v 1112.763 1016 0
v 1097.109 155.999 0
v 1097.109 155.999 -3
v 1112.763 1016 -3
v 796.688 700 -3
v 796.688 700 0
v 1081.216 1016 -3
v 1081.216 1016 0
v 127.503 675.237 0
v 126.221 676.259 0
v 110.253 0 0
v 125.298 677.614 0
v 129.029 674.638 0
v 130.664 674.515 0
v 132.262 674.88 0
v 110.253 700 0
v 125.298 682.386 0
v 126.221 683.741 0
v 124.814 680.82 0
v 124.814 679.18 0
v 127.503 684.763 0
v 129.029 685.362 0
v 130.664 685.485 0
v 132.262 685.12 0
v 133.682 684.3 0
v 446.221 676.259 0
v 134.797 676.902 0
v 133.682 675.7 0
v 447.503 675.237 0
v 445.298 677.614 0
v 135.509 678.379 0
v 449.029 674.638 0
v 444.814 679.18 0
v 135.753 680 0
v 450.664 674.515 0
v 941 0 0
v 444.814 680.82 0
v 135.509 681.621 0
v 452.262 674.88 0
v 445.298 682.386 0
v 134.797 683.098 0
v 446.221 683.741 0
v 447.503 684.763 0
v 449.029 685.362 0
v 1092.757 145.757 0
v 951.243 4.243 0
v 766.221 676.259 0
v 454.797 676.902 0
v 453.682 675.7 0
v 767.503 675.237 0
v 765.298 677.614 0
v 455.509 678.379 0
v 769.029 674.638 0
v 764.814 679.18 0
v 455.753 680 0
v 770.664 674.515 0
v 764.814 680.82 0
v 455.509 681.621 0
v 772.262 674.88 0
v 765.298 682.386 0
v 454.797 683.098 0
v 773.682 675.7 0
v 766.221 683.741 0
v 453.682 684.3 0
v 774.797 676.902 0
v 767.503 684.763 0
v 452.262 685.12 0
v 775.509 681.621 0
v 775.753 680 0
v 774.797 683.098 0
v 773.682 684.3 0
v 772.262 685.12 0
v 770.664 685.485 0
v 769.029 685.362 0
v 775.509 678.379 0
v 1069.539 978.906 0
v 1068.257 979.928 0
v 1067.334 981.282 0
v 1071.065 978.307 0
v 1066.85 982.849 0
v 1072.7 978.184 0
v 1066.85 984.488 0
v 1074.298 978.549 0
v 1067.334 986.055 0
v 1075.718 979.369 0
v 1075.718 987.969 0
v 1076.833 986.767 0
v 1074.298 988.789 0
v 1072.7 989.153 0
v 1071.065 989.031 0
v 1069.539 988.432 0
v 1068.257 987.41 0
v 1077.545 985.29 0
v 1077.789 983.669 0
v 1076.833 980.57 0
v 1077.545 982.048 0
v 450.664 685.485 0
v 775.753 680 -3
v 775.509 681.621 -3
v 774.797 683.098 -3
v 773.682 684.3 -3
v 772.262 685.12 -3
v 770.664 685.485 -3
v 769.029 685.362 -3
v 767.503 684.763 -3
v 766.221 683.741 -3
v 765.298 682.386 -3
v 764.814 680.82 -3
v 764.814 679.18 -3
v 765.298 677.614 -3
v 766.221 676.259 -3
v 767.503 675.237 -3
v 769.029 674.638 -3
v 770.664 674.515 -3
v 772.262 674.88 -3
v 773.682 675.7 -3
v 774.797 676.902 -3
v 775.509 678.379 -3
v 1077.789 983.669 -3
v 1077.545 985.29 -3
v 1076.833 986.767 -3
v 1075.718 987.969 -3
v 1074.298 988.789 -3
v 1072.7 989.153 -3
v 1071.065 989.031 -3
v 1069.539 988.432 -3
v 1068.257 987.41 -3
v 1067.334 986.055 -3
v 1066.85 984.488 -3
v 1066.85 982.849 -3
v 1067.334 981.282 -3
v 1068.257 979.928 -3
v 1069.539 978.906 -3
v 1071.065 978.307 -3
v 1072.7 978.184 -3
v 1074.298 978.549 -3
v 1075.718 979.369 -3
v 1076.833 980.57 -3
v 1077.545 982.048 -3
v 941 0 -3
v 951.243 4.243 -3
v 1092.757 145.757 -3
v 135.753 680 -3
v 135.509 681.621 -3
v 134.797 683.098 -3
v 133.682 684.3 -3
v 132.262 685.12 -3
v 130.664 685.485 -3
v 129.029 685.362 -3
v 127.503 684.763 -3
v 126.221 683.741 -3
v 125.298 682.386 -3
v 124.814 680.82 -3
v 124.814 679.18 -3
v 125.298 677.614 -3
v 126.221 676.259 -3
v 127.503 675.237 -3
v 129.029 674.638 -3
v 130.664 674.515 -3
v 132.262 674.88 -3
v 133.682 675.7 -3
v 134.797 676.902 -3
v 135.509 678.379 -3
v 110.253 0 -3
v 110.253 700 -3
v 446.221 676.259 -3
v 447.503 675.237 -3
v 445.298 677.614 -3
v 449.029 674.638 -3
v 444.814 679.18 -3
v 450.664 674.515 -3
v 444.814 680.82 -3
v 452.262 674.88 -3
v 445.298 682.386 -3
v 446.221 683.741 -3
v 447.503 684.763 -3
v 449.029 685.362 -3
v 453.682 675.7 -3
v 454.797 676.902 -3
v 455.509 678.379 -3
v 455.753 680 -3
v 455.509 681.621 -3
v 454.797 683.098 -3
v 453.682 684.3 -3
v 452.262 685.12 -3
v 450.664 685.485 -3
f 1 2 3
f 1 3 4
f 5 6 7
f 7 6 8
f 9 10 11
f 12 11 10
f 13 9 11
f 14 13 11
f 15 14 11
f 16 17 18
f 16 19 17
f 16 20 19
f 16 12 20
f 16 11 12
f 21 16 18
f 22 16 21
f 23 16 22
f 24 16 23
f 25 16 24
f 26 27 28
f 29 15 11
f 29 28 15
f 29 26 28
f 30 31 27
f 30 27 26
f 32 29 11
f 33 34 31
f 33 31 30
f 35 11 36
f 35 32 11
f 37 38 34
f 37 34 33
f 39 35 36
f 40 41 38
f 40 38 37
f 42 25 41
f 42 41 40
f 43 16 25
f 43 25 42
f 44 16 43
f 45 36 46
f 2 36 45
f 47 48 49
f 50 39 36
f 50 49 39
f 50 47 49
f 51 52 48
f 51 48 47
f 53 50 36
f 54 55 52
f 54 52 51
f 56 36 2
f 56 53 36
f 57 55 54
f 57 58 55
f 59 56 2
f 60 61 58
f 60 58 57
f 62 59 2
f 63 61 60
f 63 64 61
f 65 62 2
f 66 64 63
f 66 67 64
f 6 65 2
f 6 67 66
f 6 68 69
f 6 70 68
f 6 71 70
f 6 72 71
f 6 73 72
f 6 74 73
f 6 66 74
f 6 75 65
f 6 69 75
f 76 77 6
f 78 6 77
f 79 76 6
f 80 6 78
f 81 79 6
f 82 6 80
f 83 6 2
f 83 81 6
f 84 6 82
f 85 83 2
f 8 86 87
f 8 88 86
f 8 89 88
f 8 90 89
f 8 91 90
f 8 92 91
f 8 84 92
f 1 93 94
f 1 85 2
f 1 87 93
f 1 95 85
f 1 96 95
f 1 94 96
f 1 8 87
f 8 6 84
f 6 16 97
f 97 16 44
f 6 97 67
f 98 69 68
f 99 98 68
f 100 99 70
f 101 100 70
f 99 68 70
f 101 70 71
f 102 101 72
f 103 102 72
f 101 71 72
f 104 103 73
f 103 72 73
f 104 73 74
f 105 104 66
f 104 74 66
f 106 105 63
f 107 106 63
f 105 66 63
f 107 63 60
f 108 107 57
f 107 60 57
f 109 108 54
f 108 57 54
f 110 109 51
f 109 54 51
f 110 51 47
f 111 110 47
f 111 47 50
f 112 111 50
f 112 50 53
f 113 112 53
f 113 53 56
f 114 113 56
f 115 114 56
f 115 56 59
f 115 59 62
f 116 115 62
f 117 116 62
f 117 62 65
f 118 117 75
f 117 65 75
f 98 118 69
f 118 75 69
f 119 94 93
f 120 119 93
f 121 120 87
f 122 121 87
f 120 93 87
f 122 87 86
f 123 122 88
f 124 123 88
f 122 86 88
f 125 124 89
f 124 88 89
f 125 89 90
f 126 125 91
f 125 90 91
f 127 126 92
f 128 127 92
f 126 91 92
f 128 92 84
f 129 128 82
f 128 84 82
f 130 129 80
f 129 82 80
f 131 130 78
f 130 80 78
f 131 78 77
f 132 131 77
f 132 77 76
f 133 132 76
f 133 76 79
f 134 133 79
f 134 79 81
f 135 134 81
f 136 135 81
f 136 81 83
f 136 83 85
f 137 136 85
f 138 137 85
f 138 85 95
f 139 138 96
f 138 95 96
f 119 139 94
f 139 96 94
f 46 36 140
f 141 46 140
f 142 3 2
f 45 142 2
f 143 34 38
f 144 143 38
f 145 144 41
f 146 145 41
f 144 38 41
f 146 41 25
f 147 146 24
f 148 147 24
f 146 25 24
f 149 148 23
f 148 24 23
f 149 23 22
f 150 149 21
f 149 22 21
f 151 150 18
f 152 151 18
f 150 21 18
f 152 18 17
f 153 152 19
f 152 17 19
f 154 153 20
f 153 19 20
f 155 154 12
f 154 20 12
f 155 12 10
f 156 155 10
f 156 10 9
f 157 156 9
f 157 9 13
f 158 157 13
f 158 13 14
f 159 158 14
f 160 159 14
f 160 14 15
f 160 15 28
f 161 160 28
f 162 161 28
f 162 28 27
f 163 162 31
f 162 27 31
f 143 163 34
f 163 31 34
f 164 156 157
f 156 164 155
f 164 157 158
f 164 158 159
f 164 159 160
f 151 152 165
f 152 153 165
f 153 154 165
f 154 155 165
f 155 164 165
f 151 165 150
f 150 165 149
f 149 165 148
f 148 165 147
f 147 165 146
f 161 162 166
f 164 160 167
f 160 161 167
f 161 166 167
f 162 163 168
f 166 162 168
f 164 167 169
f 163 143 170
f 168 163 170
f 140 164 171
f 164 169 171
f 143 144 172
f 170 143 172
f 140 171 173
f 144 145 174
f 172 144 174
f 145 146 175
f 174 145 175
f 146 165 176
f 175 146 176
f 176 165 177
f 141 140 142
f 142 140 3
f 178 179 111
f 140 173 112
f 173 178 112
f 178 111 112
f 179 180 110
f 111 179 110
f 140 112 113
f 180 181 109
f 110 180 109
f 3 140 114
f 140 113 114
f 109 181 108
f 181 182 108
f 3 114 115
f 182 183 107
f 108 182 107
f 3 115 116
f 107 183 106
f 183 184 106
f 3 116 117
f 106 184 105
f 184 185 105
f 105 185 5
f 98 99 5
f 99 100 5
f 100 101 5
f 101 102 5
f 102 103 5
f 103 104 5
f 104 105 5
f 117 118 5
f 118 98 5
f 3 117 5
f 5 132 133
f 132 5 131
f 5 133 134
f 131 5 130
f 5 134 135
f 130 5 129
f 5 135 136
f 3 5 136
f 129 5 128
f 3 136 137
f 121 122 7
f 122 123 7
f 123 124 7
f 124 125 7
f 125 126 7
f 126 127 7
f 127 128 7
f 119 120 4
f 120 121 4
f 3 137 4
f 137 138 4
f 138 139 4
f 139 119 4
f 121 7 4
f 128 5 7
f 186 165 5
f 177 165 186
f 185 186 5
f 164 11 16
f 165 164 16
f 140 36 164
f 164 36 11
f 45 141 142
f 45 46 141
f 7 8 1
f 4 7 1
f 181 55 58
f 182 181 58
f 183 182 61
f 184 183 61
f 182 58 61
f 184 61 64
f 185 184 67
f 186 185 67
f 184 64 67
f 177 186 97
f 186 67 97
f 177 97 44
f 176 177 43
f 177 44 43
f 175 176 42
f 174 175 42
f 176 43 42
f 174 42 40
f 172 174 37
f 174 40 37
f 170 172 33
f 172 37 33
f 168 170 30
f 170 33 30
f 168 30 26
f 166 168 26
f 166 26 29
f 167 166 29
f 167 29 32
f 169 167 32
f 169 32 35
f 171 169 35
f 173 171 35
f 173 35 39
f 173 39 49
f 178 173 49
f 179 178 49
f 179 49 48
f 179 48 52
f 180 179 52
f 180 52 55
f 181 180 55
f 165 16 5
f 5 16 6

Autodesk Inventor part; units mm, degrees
ref_plane "YZ Plane" through (0, 0, 0) normal (1, 0, 0) x (0, 1, 0)
ref_plane "XZ Plane" through (0, 0, 0) normal (0, 1, 0) x (-1, 0, 0)
ref_plane "XY Plane" through (0, 0, 0) normal (0, 0, 1) x (1, 0, 0)
sketch "Sketch8" plane through (0, 0, 0) normal (0, 0, 1) x (1, 0, 0)
  line L0 (0, 2897) -> (1200, 2897)
  line L1 (1200, 2897) -> (1200, 0)
  line L2 (1200, 0) -> (0, 0)
  line L3 (0, 0) -> (0, 2897)
  line L4 (0, 2897) -> (1200, 0) construction
  line L5 (1200, 2897) -> (0, 0) construction
  line L6 (947, 0) -> (1097, 150)
  line L7 (1097, 150) -> (1147, 2897)
  line L8 (0, 700) -> (1200, 700)
  line L9 (1112.5806, 1006) -> (837.057, 700)
  line L10 (110.253, 0) -> (110.253, 700)
  line L11 (796.688, 700) -> (1081.2157, 1016)
  line L12 (1081.2157, 1016) -> (1112.7627, 1016)
  point P0 (600, 1448.5)
  point P1 (1107.0109, 700)
  dimension "d43" = 1200
  dimension "d44" = 2897
  dimension "d45" = 53
  dimension "d46" = 947
  dimension "d47" = 150
  dimension "d48" = 103
  dimension "d49" = 700
  dimension "d55" = 306
  dimension "d57" = 110.253
  dimension "d61" = 48
  dimension "d65" = 10
  dimension "d66" = 30
extrude "Plate4" add sketch "Sketch8" against normal blind 3 contours L7 L9 L8 L11 L12 | L8 L7 L6 L2 L10 | L7 L8 L9
chamfer "Corner Chamfer1" distance 6 angle 45 2 edges at (947, 0, -1.5) (1097, 150, -1.5)
sketch "Sketch9" plane through (0, 0, 0) normal (0, 0, 1) x (1, 0, 0)
  line L0 (1097.1092, 155.999) -> (1092.7574, 145.7574) projected
  line L1 (1097.1092, 155.999) -> (1112.7627, 1016) projected
  line L2 (1112.7627, 1016) -> (1081.2157, 1016) projected
  line L3 (1081.2157, 1016) -> (796.688, 700) projected
  line L4 (796.688, 700) -> (110.253, 700) projected
  line L5 (110.253, 700) -> (110.253, 0) projected
  line L6 (110.253, 0) -> (941, 0) projected
  line L7 (951.2426, 4.2426) -> (941, 0) projected
  line L8 (951.2426, 4.2426) -> (1092.7574, 145.7574) projected
  circle A0 centre (130.253, 680) radius 5.5
  point P0 (0, 0)
  dimension "d67" = 11
  dimension "d68" = 20
  dimension "d69" = 20
extrude "Extrusion2" cut sketch "Sketch9" against normal through all contours A0
pattern_linear "Rectangular Pattern2" count 3 spacing 320 along (1, 0, 0) of "Extrusion2"
sketch "Sketch10" plane through (0, 0, 0) normal (0, 0, 1) x (1, 0, 0)
  circle A0 centre (770.253, 680) radius 5.5 projected
  circle A1 centre (450.253, 680) radius 5.5 projected
  circle A2 centre (130.253, 680) radius 5.5 projected
  line L0 (1097.1092, 155.999) -> (1092.7574, 145.7574) projected
  line L1 (1097.1092, 155.999) -> (1112.7627, 1016) projected
  line L2 (1112.7627, 1016) -> (1081.2157, 1016) projected
  line L3 (1081.2157, 1016) -> (796.688, 700) projected
  line L4 (796.688, 700) -> (110.253, 700) projected
  line L5 (110.253, 700) -> (110.253, 0) projected
  line L6 (110.253, 0) -> (941, 0) projected
  line L7 (951.2426, 4.2426) -> (941, 0) projected
  line L8 (951.2426, 4.2426) -> (1092.7574, 145.7574) projected
  circle A3 centre (1072.2889, 983.6687) radius 5.5
  line L9 (1081.2157, 1016) -> (1112.254, 988.053)
  line L10 (1097.1092, 155.999) -> (1112.7627, 1016) projected
  point P0 (0, 0)
  dimension "d75" = 15
  dimension "d76" = 30
extrude "Extrusion3" cut sketch "Sketch10" against normal through all contours A3
equation "\"d50\" = Thickness"
equation "\"BendReliefWidth\" = Thickness"
equation "\"BendReliefDepth\" = 0.5 * Thickness"
equation "\"CornerReliefSize\" = 4 * Thickness"
equation "\"MinimumRemnant\" = 2 * Thickness"
equation "\"TransitionRadius\" = BendRadius"
equation "\"JacobiRadiusSize\" = BendRadius"
equation "\"GapSize\" = Thickness"
equation "\"Thickness\" = 3"
equation "\"BendRadius\" = 5"
properties part number "BSH 015 board cone wall" material "09g2s"
